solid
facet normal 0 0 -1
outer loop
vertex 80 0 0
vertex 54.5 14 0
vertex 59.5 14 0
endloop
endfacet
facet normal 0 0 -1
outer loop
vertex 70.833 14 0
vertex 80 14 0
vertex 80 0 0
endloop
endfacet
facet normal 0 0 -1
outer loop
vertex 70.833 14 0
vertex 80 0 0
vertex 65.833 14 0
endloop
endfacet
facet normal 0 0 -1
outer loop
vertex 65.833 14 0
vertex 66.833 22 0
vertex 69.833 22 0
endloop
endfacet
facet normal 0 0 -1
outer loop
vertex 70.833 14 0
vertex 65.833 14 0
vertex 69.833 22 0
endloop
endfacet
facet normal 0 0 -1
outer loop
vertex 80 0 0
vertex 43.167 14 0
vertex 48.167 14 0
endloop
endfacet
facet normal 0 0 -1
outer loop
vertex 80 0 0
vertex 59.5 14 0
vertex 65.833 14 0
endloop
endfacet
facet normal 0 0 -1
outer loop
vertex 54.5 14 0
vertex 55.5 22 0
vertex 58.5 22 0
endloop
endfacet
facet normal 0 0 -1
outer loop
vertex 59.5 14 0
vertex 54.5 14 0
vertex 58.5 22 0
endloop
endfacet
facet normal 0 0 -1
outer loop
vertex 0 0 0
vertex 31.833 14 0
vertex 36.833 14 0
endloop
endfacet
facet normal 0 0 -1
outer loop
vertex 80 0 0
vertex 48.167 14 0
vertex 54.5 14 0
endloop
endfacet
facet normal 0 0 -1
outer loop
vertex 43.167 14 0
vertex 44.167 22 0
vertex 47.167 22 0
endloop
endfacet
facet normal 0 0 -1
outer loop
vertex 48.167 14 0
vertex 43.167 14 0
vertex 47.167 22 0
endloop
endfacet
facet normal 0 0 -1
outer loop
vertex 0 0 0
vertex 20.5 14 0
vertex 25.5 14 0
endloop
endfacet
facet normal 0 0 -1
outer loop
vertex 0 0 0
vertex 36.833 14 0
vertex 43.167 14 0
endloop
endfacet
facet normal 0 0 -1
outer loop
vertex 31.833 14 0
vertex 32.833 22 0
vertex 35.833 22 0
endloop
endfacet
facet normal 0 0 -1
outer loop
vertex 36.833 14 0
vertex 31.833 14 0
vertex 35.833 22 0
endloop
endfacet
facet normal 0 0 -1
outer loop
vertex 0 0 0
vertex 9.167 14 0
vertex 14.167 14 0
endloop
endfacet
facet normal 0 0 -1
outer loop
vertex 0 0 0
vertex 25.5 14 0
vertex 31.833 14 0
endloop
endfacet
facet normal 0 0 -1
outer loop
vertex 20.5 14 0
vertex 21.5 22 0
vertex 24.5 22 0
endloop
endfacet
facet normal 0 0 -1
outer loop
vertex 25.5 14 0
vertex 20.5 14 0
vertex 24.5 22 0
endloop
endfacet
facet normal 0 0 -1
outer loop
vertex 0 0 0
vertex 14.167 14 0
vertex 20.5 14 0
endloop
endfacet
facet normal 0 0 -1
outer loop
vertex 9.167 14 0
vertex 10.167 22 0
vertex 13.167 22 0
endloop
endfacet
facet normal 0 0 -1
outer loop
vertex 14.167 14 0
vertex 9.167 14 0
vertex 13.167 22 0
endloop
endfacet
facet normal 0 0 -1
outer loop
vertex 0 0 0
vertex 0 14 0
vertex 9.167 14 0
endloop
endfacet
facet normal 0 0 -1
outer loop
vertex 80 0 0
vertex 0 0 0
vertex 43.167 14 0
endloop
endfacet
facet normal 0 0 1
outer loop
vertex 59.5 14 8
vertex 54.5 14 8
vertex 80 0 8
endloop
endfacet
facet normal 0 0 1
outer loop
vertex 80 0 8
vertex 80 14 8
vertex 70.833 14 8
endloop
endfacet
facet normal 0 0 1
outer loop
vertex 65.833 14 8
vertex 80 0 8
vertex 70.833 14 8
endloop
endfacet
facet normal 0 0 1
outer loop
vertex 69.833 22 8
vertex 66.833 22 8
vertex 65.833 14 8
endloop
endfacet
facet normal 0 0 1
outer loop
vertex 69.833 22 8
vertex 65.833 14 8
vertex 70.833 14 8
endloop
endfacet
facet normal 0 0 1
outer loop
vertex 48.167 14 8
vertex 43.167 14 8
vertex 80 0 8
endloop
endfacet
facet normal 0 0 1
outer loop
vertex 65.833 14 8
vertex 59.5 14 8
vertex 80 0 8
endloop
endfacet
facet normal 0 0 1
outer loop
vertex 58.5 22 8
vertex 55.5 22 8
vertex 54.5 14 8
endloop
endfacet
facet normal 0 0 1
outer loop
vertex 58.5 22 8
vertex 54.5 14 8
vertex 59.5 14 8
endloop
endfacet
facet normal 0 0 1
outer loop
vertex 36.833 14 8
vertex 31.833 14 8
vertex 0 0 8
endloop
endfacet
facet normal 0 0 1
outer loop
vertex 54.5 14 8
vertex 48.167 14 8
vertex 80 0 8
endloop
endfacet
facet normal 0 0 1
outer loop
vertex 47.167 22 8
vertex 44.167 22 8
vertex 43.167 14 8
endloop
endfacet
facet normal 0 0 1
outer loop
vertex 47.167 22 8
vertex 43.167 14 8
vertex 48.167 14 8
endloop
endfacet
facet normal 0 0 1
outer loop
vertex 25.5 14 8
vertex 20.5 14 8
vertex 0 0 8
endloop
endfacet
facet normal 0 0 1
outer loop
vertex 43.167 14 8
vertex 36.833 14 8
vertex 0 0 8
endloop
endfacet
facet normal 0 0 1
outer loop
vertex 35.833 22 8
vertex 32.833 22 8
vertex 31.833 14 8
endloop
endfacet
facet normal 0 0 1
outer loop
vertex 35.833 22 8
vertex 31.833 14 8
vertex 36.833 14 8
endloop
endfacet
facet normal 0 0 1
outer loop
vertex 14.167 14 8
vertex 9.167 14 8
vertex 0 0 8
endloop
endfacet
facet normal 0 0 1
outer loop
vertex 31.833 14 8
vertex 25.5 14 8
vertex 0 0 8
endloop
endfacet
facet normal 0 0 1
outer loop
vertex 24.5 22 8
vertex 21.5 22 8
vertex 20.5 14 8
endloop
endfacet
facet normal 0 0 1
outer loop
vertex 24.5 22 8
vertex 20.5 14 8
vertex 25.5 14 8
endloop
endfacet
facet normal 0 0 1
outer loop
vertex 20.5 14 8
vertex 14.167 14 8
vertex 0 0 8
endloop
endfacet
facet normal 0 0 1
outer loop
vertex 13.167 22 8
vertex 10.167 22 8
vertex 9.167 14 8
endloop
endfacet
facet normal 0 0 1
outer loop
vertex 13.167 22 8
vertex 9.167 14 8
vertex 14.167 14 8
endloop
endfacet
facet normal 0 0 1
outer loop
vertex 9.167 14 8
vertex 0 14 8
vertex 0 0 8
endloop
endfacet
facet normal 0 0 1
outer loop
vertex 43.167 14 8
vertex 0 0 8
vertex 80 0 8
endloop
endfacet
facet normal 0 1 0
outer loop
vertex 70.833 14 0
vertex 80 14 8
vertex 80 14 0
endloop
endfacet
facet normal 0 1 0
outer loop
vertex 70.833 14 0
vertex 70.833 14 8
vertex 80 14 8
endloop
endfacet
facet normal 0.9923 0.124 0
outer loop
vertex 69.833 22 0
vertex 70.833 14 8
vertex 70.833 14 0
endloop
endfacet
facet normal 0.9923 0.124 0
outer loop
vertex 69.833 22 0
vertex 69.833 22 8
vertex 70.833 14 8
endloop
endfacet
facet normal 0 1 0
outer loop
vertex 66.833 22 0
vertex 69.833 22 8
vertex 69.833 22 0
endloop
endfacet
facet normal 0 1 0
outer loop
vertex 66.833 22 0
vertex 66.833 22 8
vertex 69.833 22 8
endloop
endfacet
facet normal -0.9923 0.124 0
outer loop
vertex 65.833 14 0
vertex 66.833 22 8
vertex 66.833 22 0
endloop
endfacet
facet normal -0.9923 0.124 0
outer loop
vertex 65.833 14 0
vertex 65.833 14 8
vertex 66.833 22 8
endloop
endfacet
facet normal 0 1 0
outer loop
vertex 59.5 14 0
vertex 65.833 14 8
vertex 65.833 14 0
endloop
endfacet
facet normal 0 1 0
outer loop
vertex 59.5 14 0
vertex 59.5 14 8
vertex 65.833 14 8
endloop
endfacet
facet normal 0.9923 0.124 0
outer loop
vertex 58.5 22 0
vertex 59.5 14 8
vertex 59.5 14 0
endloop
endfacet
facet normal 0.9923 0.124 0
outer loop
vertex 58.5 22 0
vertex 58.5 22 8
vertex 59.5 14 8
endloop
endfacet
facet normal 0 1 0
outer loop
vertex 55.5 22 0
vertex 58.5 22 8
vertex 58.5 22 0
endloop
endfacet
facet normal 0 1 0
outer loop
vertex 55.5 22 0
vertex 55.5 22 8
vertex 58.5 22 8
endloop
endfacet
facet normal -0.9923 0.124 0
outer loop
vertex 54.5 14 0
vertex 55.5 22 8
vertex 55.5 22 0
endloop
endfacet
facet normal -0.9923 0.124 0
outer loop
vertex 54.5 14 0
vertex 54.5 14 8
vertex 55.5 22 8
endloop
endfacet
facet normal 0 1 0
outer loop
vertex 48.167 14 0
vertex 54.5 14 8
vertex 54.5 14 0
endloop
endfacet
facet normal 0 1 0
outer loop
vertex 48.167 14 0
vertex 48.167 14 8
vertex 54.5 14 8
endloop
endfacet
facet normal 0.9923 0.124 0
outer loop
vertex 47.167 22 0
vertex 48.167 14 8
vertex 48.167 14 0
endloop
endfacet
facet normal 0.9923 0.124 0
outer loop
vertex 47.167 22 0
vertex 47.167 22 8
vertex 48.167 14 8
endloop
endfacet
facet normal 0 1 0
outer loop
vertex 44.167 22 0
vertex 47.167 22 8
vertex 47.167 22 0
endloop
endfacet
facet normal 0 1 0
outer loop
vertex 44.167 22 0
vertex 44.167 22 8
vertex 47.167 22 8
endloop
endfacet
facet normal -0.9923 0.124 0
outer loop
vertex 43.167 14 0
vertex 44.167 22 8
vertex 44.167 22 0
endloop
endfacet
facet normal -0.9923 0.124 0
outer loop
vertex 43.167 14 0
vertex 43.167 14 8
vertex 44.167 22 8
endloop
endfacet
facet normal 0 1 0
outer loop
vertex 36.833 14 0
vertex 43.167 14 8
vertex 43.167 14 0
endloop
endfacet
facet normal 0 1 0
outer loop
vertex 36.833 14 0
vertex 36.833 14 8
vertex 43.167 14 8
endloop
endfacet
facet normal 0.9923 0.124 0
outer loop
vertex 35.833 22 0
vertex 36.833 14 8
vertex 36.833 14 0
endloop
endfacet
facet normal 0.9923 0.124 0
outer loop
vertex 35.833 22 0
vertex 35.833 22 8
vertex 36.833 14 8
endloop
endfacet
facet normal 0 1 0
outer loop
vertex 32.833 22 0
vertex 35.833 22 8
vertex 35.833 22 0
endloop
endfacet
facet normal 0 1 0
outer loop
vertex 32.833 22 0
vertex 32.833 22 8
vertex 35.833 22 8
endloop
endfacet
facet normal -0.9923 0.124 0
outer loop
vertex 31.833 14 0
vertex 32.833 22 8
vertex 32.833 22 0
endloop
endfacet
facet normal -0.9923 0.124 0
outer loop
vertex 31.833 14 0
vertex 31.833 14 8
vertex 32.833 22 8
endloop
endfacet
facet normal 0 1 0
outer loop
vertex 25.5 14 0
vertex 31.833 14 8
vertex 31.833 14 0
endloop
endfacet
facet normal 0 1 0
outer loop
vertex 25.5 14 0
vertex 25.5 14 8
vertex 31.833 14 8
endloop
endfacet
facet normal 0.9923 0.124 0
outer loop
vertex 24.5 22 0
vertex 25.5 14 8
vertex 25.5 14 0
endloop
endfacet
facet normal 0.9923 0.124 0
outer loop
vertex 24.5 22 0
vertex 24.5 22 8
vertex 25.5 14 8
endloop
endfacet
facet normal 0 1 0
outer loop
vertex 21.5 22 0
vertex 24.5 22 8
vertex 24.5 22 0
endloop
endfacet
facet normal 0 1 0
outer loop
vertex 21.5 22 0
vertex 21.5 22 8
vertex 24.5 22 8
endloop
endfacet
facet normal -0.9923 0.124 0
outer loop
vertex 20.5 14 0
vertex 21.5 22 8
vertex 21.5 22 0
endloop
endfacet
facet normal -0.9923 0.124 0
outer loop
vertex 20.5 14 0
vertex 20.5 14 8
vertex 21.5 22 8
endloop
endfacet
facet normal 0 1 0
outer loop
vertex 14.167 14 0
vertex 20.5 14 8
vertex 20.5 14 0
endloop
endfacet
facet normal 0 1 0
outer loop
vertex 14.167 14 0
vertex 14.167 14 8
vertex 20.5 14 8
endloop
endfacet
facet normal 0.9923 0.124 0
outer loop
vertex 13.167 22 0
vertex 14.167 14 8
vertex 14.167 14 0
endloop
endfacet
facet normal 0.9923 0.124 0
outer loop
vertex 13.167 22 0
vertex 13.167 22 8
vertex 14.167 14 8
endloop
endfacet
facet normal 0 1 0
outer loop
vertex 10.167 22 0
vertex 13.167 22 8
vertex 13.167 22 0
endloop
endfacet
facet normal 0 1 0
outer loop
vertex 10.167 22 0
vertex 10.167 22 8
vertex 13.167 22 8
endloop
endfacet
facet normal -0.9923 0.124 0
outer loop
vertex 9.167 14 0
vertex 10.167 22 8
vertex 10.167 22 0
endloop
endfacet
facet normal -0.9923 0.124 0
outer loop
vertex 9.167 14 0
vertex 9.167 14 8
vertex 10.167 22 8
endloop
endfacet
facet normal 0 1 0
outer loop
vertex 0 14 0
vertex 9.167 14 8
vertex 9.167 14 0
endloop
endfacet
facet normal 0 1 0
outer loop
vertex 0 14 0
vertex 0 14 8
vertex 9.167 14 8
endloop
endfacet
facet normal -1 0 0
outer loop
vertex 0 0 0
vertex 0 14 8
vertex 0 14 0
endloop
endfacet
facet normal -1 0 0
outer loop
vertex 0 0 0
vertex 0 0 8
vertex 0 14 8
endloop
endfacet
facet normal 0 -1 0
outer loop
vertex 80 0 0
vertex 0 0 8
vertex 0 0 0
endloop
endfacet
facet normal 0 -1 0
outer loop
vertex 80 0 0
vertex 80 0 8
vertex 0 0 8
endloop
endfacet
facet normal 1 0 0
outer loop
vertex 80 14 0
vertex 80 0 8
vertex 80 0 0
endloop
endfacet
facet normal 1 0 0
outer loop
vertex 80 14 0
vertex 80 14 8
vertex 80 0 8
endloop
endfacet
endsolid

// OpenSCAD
$fn = 32;

// ----------------------------------------------------------------------
// Gear rack: 6 teeth on a 80 mm bar, pitch 11.33 mm
// ----------------------------------------------------------------------

// --- parameters (mm) ---
profile_height = 8;       // extrusion height
profile_points = 28;      // points of the closed outline

profile = [[0, 0], [80, 0], [80, 14], [70.833, 14], [69.833, 22], [66.833, 22], [65.833, 14], [59.5, 14], [58.5, 22], [55.5, 22], [54.5, 14], [48.167, 14], [47.167, 22], [44.167, 22], [43.167, 14], [36.833, 14], [35.833, 22], [32.833, 22], [31.833, 14], [25.5, 14], [24.5, 22], [21.5, 22], [20.5, 14], [14.167, 14], [13.167, 22], [10.167, 22], [9.167, 14], [0, 14]];  // single closed polygon, 28 points, counter clockwise

// --- the one profile operation ---
linear_extrude(height = profile_height) polygon(points = profile);
